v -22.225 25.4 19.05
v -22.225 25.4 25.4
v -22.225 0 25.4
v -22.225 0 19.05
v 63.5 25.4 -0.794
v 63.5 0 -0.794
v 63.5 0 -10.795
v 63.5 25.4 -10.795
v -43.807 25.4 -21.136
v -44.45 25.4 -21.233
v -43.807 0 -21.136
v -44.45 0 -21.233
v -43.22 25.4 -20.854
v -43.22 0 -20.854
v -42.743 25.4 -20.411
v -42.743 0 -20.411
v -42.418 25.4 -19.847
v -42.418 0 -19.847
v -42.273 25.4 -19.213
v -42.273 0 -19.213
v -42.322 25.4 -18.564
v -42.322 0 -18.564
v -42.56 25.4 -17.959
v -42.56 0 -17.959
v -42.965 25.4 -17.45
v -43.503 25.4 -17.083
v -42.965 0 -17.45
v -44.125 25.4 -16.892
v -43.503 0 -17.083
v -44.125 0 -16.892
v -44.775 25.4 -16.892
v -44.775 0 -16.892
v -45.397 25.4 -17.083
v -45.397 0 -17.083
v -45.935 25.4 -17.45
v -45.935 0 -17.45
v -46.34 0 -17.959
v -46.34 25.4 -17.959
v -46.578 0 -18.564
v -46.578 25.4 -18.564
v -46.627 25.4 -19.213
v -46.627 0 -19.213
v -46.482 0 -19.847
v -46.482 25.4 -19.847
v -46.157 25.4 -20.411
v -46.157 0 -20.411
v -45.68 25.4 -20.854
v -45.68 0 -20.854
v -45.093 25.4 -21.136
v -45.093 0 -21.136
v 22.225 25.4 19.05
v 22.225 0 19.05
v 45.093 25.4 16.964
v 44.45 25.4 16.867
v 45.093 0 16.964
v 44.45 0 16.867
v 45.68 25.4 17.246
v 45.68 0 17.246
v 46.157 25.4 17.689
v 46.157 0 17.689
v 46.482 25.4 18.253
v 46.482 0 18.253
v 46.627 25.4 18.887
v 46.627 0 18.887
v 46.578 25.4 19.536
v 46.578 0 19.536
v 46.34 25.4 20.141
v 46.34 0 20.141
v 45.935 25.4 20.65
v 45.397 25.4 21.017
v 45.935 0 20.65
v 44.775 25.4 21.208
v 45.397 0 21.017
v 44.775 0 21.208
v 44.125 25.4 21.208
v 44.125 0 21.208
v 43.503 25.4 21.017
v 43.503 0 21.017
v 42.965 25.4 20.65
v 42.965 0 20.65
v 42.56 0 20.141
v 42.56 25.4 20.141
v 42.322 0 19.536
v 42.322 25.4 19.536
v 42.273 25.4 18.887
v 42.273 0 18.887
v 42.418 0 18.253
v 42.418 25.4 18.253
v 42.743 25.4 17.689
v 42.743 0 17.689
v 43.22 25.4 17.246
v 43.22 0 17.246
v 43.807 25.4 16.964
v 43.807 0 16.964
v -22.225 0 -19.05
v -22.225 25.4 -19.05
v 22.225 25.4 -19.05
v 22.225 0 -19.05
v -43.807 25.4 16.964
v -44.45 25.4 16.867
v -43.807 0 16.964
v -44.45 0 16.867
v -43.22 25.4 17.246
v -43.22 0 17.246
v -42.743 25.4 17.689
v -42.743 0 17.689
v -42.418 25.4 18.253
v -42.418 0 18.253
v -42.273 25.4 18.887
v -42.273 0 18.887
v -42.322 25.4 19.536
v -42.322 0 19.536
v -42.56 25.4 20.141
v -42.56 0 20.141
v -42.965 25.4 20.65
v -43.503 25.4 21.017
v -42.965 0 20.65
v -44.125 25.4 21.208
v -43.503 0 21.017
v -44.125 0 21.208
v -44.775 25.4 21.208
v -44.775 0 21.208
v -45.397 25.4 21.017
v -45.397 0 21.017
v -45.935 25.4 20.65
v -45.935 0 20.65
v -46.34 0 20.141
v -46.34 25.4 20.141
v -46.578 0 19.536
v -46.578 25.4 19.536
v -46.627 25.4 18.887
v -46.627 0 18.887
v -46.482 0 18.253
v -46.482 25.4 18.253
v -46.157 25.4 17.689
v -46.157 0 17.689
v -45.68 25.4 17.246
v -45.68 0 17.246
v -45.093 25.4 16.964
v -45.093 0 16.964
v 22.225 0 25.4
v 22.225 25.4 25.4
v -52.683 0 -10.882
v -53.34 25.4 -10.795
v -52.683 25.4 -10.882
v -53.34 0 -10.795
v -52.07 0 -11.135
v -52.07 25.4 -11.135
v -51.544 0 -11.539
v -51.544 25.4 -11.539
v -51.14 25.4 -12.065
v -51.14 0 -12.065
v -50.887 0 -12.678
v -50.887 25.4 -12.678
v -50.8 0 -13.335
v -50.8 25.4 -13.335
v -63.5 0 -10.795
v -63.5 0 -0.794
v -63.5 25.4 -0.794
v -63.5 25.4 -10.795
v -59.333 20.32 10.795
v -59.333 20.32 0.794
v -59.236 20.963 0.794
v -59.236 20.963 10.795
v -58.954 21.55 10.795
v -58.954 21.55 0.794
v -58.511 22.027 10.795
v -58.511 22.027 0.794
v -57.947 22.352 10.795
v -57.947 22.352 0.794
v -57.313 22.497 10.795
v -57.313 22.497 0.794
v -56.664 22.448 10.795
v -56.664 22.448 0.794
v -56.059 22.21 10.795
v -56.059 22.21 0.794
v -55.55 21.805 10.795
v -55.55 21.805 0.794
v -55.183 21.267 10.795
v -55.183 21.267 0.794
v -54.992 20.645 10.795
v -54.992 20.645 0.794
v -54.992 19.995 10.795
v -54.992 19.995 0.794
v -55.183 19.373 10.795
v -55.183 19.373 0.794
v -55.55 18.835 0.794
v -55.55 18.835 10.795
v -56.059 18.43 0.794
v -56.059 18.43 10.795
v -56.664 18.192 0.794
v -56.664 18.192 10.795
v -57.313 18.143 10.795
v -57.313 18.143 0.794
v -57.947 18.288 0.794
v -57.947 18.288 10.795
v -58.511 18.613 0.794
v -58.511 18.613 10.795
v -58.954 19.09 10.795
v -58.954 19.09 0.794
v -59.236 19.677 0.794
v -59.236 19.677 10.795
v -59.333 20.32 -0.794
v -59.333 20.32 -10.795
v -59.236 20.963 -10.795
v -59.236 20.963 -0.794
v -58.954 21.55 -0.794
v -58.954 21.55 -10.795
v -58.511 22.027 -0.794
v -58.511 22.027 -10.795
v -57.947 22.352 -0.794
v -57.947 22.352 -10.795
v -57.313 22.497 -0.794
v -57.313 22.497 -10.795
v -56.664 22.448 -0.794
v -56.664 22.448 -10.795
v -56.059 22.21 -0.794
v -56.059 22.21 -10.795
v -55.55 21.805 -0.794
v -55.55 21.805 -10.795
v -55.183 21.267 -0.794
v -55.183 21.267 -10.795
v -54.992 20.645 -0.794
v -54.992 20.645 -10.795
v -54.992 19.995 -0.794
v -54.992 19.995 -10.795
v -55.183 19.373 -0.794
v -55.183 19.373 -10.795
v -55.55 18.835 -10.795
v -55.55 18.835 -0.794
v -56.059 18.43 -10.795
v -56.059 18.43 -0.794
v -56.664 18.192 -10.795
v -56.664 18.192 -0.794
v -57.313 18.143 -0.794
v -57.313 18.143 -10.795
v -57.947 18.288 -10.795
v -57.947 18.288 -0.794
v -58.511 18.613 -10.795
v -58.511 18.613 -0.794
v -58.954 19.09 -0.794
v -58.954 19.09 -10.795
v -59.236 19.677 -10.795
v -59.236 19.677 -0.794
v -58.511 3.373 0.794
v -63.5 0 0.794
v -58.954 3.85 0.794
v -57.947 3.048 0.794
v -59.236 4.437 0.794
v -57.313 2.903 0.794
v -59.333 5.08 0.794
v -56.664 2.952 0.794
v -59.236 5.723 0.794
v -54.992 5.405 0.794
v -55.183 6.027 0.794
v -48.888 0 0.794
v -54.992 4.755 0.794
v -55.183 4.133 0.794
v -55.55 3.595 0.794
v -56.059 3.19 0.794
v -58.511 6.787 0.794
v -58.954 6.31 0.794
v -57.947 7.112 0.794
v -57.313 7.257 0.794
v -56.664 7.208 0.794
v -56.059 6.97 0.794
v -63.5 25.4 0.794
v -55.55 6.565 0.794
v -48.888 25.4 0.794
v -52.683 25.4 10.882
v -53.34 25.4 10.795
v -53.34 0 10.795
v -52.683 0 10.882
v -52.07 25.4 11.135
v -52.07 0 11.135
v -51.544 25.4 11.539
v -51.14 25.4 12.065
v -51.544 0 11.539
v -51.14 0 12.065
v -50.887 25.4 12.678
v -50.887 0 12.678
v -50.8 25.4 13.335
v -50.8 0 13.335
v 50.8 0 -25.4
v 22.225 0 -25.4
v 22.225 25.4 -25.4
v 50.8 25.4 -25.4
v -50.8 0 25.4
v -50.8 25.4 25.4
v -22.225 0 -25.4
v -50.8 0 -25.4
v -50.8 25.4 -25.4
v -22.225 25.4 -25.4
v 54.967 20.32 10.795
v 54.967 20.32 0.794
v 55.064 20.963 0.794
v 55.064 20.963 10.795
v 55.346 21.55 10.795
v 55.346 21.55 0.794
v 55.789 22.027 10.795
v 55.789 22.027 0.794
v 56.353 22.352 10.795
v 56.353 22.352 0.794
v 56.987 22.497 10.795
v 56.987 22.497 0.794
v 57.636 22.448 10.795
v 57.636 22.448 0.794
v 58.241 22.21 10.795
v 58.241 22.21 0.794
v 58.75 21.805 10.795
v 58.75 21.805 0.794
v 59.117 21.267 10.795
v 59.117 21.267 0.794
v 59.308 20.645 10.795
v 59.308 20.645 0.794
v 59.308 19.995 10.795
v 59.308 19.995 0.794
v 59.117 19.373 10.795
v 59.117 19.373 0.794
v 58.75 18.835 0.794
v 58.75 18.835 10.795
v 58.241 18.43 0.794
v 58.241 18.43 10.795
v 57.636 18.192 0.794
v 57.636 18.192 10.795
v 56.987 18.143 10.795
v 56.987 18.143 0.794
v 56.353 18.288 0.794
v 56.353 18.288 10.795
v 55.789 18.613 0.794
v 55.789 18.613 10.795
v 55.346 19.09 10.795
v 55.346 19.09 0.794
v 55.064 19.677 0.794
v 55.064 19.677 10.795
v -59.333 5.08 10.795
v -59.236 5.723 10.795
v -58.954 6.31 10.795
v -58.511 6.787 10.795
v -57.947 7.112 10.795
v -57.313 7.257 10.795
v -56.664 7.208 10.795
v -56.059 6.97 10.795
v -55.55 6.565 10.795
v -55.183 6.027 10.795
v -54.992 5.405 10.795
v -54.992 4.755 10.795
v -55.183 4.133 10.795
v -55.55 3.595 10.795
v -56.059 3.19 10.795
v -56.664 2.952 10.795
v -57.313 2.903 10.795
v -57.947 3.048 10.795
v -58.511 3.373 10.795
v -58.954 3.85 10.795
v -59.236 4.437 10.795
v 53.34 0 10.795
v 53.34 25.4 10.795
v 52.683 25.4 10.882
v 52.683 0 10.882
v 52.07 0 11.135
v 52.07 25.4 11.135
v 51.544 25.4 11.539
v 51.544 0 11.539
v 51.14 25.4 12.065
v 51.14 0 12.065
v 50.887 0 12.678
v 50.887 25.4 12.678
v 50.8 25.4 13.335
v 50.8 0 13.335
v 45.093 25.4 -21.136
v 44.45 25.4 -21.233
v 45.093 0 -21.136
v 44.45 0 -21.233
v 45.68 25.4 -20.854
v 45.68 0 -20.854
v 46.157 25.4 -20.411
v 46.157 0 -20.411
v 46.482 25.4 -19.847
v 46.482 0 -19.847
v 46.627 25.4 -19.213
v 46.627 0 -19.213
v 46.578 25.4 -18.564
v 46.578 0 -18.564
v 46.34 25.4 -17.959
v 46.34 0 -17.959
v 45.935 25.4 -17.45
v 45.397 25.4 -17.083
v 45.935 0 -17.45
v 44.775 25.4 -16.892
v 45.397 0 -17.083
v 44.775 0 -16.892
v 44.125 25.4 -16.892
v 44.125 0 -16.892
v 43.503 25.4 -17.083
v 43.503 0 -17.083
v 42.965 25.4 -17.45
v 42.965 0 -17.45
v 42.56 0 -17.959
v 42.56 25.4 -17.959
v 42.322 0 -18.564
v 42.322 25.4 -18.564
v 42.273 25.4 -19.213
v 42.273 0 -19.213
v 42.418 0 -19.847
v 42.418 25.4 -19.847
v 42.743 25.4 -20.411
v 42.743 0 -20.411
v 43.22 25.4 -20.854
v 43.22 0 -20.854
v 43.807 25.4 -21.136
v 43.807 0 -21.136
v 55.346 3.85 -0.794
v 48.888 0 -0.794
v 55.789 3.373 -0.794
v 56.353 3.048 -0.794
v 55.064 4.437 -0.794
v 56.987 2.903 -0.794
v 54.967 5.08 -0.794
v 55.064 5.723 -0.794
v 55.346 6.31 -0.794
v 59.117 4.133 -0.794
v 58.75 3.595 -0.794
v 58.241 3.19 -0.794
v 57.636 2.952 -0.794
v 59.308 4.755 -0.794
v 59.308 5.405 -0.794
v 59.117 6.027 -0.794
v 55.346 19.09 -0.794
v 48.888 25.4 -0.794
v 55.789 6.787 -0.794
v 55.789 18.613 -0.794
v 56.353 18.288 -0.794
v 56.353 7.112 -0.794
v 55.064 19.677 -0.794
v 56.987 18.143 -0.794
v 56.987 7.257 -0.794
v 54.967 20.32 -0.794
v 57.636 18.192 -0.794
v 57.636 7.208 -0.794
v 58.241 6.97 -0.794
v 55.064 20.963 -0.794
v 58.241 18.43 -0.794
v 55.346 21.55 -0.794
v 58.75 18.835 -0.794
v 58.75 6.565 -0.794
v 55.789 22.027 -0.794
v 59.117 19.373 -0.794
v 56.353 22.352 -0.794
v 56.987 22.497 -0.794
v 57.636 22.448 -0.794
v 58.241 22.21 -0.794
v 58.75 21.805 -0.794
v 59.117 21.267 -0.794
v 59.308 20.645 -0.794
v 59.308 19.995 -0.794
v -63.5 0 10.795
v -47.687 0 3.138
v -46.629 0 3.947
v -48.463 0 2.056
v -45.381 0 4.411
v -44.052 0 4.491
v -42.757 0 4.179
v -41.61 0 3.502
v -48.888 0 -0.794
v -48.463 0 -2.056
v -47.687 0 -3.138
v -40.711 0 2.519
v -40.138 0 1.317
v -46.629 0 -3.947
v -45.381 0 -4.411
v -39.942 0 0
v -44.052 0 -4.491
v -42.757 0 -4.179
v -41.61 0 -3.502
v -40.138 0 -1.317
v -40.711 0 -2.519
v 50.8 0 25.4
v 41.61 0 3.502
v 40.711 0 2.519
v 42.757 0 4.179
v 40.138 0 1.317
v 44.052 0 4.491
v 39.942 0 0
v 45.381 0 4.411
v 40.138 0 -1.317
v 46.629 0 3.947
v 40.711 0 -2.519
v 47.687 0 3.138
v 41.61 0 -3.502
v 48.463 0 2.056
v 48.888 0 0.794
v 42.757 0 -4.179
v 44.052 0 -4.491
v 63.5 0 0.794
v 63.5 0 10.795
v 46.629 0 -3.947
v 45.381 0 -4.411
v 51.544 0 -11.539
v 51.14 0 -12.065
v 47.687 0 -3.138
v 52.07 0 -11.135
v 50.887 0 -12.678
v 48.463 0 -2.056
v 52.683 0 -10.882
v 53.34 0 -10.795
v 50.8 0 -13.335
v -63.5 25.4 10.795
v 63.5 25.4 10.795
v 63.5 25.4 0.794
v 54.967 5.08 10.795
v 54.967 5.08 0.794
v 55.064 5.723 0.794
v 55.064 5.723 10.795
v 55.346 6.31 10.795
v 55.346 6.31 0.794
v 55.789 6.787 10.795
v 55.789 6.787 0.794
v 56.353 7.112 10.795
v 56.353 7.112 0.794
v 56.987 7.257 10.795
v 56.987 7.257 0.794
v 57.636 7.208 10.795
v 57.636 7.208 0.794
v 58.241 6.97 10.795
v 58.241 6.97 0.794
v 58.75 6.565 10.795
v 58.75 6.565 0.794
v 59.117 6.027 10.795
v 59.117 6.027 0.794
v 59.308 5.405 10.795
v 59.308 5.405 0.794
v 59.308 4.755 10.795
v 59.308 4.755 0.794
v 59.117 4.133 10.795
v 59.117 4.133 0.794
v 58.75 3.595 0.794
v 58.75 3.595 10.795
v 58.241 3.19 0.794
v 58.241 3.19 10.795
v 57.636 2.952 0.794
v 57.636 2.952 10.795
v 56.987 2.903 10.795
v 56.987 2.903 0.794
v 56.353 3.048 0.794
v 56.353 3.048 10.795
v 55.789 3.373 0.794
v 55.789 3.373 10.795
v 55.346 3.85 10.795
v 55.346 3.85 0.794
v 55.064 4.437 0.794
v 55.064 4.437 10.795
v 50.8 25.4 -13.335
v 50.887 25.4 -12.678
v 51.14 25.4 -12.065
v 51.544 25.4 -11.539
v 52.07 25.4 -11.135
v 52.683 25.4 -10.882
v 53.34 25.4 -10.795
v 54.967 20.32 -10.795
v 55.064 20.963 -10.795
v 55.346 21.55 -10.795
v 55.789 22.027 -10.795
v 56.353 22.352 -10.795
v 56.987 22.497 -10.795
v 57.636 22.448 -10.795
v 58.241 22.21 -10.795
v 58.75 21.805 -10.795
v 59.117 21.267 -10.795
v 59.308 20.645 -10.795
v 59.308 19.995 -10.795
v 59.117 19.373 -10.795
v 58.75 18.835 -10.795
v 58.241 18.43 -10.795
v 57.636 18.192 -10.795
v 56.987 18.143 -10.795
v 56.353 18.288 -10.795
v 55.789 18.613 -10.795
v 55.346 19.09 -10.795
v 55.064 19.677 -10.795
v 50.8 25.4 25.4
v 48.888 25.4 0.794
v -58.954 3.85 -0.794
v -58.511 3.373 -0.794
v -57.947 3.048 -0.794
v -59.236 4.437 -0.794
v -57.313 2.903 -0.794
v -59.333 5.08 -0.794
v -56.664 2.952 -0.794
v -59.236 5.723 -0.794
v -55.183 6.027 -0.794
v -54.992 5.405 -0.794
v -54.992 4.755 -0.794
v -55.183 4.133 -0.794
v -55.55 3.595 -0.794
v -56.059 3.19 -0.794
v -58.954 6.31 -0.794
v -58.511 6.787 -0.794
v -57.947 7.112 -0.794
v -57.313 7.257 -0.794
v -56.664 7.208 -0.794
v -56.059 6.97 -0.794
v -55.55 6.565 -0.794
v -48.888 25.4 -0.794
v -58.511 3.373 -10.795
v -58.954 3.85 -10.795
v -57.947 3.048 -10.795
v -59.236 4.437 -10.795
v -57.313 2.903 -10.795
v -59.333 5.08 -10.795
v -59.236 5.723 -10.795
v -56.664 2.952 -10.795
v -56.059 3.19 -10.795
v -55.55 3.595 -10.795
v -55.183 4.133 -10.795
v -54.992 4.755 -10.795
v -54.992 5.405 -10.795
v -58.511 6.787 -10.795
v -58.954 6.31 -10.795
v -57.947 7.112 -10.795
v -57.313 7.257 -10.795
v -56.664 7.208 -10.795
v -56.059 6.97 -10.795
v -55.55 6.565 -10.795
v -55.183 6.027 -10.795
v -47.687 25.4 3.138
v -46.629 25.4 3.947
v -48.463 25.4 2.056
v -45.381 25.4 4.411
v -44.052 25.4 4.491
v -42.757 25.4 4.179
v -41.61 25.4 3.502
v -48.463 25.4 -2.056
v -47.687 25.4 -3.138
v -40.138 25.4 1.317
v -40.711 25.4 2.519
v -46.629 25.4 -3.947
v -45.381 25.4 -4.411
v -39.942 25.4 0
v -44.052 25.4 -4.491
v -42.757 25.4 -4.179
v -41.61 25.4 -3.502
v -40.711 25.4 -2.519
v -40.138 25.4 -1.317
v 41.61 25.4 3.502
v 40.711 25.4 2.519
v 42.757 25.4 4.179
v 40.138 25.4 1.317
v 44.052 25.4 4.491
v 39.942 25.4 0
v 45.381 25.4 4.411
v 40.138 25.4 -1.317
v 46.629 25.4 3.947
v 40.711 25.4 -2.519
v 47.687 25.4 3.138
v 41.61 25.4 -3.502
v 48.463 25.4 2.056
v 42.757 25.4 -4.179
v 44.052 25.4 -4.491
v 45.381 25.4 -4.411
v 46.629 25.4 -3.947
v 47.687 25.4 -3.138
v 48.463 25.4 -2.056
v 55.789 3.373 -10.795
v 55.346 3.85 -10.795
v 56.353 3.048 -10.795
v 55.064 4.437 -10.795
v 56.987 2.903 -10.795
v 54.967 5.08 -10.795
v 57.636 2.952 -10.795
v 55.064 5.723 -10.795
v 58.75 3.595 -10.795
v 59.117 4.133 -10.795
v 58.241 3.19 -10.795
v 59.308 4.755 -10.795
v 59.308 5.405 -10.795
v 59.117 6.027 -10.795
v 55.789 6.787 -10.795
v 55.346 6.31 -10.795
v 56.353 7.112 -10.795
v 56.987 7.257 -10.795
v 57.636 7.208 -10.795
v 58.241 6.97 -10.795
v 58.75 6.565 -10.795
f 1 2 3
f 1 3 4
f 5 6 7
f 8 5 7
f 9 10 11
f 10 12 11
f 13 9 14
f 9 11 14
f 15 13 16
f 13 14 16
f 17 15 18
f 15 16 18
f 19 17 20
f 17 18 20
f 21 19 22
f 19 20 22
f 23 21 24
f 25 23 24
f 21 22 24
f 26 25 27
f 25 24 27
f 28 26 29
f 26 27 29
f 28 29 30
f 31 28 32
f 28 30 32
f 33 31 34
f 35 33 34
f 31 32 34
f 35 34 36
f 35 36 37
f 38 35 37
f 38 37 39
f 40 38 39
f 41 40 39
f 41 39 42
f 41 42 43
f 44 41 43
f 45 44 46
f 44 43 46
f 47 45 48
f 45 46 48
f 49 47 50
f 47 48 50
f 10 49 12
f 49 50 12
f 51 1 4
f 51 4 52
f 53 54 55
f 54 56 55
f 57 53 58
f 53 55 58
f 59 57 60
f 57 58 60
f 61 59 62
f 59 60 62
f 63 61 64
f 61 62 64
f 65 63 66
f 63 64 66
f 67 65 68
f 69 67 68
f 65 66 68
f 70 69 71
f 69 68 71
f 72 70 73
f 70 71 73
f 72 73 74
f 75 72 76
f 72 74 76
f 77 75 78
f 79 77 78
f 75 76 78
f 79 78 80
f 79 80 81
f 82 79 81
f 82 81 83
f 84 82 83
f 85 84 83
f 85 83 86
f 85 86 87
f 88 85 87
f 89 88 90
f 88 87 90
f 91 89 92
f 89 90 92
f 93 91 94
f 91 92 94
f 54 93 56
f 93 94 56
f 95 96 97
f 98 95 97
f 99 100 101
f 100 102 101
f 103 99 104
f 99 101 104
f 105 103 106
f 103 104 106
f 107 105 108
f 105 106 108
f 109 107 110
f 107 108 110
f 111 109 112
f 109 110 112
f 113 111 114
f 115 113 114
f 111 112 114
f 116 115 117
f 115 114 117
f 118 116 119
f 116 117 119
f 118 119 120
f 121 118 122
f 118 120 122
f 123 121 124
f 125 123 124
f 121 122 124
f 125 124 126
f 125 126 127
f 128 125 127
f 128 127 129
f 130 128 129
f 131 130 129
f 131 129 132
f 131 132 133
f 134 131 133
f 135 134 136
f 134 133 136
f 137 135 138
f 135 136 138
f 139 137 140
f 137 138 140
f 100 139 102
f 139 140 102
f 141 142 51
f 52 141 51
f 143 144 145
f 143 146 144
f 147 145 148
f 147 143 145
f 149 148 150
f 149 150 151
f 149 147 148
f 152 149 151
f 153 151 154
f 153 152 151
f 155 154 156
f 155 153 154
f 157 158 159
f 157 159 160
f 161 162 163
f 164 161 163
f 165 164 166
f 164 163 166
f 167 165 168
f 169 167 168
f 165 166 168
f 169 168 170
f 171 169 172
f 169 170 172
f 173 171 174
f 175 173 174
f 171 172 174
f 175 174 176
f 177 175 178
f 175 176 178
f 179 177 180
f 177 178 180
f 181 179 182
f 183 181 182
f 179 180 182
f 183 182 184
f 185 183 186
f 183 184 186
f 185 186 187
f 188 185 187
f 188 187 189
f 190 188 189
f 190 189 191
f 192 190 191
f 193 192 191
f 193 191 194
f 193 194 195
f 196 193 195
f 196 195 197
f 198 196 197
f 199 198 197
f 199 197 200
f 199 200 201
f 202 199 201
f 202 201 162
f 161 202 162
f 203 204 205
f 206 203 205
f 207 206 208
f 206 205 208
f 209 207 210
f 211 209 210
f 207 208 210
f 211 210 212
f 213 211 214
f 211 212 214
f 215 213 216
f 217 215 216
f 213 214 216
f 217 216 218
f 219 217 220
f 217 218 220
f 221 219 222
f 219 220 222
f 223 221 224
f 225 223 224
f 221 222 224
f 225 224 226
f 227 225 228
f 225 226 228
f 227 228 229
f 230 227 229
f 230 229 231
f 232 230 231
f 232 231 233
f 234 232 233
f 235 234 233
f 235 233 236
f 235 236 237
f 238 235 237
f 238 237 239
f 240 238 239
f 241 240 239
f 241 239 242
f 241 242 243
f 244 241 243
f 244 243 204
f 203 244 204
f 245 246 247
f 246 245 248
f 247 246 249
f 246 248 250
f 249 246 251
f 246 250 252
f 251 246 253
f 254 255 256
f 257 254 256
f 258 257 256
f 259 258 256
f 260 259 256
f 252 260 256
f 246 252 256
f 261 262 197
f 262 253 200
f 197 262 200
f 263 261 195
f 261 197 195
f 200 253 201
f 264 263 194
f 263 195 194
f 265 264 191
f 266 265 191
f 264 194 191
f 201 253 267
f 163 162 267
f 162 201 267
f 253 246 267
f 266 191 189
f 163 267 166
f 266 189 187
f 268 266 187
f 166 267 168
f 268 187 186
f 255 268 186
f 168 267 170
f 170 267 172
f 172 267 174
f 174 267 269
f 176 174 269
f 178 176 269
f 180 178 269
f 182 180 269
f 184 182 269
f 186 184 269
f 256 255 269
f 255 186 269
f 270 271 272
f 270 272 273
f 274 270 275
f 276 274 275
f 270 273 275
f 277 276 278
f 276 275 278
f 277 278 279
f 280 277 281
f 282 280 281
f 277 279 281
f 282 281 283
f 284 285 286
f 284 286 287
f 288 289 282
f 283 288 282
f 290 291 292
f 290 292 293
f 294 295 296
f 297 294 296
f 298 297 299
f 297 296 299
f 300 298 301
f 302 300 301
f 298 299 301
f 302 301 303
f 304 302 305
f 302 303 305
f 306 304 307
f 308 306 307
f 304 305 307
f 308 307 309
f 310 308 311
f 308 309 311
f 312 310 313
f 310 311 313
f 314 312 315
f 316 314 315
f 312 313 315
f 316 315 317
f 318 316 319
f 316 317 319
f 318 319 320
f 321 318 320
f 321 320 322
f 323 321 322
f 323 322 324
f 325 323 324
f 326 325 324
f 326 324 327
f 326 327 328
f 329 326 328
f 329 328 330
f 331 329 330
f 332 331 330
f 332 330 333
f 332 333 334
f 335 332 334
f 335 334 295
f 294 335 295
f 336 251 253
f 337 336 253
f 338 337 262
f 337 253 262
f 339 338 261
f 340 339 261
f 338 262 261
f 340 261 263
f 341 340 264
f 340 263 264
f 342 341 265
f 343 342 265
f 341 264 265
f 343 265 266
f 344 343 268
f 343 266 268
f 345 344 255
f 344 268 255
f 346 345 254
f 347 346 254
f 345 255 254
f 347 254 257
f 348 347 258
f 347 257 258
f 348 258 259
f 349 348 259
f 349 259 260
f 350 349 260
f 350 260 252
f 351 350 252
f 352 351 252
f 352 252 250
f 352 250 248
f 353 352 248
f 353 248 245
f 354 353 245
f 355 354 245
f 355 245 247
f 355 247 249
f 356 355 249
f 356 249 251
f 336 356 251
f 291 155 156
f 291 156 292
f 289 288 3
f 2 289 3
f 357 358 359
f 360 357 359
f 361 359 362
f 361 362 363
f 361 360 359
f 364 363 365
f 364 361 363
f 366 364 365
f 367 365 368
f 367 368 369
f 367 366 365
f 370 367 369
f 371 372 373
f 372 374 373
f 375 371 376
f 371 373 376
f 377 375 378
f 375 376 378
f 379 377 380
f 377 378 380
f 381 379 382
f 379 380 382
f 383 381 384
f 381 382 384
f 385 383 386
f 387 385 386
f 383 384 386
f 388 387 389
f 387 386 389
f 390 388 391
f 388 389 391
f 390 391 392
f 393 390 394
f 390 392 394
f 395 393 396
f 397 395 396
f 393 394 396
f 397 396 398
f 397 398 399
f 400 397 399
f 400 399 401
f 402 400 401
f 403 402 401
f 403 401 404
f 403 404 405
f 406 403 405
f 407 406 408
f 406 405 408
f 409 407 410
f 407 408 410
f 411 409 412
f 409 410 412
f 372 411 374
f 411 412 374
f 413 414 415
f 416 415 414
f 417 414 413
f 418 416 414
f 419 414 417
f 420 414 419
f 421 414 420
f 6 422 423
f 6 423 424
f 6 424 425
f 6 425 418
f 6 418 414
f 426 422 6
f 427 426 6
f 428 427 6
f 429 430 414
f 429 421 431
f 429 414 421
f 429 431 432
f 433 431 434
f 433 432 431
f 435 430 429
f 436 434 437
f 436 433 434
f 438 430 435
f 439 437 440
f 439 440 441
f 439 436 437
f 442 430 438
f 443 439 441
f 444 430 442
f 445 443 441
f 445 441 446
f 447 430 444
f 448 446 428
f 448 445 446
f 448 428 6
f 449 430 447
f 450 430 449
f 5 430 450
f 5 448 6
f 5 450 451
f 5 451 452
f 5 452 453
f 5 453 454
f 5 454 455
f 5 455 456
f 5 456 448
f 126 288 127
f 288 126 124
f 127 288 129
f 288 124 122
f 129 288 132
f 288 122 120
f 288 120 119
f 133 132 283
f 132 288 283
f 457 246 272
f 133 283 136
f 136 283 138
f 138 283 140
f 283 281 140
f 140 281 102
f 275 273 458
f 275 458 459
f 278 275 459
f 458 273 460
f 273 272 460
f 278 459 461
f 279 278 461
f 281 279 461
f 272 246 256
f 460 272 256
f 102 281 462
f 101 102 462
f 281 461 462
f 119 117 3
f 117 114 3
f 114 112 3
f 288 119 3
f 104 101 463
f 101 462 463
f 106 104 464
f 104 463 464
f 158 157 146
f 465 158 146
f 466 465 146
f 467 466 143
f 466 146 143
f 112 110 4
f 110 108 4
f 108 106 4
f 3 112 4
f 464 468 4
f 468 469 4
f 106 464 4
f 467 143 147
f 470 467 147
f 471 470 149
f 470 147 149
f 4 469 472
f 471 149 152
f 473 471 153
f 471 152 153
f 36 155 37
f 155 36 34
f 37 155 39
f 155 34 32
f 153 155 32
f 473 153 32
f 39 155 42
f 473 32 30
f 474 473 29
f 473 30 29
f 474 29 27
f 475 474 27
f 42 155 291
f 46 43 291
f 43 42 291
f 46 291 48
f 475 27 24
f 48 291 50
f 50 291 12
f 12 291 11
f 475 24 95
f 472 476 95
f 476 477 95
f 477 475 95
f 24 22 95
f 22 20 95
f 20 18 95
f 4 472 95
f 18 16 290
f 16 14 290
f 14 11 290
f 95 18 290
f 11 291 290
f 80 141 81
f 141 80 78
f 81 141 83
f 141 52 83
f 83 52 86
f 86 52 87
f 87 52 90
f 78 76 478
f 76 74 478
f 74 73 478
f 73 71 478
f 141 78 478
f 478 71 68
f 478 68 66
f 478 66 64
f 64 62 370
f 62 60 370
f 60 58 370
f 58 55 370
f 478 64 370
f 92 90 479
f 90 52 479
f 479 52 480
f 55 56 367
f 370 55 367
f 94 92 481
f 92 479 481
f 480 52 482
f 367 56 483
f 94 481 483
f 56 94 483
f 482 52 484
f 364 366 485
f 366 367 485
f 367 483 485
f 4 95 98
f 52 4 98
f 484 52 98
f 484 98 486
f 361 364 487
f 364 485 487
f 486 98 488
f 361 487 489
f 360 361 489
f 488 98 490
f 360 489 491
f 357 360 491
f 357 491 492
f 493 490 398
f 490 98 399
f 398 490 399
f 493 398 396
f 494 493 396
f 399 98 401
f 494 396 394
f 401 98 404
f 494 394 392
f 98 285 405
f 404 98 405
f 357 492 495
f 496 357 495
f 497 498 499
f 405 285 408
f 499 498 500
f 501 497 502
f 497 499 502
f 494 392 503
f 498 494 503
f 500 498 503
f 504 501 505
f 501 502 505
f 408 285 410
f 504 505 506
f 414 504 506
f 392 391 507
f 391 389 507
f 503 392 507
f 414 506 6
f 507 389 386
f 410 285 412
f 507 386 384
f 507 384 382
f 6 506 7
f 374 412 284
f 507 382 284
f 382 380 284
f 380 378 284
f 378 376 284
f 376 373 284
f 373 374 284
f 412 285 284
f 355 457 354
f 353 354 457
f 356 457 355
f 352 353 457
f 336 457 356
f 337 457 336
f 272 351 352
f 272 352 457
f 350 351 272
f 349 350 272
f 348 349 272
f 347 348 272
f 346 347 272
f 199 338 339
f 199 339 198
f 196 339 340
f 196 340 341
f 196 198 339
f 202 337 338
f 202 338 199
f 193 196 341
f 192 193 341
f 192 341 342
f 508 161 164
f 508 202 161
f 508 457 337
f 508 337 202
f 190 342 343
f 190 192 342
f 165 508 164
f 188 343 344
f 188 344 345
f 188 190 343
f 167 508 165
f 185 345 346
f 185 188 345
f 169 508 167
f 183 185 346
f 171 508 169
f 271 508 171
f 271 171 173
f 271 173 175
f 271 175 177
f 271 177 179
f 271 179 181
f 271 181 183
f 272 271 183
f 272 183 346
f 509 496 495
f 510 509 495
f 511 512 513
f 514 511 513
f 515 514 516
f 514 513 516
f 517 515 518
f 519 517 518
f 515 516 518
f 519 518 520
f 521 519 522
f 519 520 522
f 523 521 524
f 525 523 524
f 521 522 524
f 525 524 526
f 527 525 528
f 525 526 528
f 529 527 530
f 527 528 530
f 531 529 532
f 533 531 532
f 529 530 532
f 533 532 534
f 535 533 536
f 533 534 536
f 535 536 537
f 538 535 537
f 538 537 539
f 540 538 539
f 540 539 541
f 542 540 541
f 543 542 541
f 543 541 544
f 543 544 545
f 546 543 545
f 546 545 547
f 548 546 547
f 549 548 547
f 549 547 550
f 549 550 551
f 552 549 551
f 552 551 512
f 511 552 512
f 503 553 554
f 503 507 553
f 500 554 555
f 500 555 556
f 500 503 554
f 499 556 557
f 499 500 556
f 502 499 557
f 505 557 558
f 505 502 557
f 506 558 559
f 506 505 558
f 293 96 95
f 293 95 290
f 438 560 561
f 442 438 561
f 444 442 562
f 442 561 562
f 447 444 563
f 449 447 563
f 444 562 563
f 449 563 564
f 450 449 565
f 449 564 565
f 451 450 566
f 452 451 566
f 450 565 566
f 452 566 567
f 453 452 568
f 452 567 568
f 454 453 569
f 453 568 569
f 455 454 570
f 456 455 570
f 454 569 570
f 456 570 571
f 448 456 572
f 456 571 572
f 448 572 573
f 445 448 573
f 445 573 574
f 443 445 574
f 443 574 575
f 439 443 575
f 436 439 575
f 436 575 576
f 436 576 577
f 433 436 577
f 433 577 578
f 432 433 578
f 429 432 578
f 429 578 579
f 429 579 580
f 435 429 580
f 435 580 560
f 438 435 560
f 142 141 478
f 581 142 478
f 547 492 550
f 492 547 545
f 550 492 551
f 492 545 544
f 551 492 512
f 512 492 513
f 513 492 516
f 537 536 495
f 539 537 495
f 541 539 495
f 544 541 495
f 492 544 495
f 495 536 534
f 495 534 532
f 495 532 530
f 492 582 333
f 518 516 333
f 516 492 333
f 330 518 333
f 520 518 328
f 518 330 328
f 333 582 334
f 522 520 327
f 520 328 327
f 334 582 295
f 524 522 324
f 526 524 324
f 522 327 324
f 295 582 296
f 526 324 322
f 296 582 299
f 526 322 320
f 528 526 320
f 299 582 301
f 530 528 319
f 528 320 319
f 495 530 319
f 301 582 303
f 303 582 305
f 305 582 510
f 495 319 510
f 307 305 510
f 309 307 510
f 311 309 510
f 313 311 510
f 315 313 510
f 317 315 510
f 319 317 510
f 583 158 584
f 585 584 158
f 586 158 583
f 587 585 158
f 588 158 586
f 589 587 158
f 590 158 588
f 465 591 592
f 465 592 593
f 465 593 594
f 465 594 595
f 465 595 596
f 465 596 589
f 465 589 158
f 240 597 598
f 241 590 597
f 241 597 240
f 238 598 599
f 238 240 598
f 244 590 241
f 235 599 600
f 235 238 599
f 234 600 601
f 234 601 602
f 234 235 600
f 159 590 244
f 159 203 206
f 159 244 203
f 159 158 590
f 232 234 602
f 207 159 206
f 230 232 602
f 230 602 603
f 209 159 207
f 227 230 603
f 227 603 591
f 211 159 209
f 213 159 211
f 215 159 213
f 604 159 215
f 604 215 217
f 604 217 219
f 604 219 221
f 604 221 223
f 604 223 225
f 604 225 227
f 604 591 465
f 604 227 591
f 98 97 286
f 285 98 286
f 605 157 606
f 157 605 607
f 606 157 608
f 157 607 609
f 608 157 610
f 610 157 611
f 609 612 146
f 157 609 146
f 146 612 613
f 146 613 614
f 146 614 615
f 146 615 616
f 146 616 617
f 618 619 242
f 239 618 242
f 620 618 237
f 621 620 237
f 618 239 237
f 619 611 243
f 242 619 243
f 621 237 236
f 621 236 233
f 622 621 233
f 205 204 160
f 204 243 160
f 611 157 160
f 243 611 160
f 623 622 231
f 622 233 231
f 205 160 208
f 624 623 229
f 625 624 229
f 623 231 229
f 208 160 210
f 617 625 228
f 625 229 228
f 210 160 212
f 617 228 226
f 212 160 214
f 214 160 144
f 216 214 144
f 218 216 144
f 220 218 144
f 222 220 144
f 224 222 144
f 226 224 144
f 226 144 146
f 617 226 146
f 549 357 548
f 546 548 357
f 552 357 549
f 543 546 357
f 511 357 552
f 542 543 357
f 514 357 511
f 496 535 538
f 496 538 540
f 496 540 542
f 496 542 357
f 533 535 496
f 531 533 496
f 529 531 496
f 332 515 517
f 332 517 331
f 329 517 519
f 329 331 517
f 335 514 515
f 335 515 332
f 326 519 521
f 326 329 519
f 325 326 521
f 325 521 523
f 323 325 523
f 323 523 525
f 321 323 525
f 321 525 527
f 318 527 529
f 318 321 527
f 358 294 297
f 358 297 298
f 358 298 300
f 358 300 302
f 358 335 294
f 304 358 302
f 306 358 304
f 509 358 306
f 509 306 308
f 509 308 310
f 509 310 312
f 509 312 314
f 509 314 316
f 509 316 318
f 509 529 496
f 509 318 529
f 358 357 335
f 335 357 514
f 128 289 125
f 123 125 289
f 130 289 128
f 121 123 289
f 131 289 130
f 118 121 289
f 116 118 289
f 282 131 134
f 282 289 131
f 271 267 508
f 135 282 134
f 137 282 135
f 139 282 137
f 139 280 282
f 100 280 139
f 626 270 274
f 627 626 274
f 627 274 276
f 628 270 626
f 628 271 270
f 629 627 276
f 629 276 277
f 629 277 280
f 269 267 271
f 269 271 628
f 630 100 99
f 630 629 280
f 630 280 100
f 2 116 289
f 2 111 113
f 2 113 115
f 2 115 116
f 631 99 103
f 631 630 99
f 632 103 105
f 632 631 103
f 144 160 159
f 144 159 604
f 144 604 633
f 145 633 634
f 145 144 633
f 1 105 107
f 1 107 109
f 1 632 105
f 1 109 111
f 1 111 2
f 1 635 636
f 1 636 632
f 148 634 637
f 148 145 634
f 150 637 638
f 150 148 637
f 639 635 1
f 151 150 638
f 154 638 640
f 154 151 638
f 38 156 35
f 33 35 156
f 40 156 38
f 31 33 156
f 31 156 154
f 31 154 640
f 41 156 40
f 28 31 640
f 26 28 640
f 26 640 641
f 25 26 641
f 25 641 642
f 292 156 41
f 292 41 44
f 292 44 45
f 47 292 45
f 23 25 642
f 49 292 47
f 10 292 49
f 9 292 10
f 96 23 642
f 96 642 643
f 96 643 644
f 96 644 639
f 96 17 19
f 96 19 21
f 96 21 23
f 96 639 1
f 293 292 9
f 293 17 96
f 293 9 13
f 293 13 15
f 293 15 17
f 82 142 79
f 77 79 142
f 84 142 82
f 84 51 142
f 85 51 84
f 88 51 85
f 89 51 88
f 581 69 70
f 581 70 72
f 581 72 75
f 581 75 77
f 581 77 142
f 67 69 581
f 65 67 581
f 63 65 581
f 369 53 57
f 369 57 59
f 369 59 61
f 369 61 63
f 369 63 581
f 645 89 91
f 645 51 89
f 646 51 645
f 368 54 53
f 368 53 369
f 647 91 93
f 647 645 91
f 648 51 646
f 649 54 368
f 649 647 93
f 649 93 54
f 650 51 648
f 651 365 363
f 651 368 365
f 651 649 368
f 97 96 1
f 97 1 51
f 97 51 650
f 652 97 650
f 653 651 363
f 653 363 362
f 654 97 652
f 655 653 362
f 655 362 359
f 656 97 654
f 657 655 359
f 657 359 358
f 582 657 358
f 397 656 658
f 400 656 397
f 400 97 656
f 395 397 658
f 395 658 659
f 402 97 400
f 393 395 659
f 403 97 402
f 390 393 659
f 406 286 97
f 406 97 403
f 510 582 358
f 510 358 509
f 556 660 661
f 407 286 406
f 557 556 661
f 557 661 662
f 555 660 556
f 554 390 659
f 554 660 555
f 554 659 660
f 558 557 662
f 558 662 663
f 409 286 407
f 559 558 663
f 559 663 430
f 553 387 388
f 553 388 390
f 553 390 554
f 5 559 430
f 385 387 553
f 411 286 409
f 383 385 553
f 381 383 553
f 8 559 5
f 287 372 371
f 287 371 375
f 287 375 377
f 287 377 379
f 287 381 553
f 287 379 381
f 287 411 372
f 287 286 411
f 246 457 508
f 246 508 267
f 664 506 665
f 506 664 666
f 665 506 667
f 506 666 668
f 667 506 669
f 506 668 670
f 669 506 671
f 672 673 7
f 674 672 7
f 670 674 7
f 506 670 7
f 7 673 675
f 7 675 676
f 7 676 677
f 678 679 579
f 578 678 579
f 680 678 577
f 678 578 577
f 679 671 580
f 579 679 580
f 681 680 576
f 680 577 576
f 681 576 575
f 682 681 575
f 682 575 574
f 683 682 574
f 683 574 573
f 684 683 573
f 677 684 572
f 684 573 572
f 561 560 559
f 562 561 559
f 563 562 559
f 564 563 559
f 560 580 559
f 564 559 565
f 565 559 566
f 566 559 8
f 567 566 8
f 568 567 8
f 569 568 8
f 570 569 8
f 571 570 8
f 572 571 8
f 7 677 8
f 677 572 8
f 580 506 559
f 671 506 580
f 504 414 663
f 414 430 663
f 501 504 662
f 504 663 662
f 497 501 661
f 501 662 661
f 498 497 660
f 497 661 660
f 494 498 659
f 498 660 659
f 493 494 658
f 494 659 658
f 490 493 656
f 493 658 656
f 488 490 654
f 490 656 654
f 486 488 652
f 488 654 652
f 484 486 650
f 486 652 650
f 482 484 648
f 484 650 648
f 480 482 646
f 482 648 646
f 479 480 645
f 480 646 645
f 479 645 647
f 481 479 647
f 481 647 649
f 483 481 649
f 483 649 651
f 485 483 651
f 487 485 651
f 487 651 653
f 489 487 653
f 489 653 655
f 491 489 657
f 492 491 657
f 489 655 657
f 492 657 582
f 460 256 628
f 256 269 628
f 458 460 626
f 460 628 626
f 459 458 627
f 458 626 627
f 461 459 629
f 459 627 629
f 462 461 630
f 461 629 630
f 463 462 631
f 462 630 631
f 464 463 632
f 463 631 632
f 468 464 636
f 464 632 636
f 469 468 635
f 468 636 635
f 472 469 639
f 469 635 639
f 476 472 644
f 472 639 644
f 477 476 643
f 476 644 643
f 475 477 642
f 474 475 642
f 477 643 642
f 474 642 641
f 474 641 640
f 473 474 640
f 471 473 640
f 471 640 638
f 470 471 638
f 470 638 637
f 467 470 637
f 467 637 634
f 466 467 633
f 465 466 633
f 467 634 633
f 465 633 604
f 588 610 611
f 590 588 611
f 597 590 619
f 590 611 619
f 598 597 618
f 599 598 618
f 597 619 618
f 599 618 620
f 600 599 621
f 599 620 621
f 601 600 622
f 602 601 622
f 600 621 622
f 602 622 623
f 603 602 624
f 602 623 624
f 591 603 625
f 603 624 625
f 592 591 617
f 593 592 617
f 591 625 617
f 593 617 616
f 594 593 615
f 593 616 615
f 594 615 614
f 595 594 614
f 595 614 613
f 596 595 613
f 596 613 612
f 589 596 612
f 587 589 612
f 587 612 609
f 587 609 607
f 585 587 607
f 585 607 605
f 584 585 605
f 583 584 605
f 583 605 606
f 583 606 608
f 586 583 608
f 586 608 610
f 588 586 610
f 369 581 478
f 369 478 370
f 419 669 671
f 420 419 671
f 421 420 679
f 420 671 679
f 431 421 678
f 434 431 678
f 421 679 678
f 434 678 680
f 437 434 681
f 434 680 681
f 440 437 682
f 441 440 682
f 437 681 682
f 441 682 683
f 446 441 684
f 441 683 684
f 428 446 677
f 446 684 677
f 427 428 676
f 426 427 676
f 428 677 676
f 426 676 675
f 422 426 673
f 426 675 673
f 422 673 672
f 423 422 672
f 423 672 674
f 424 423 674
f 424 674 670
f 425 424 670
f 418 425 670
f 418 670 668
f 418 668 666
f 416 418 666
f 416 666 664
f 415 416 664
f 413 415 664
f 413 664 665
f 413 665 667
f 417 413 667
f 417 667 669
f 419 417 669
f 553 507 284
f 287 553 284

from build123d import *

# Parameters (mm, degrees)
SKETCH1_W                            = 127
SKETCH1_H                            = 50.8
BOSS_EXTRUDE1_DEPTH                  = 25.4
SKETCH2_R                            = 4.5085
CUT_EXTRUDE1_DEPTH                   = 73.955945611
SKETCH3_W                            = 19.05
SKETCH3_H                            = 1.5875
CUT_EXTRUDE2_DEPTH                   = 73.955945611
SKETCH4_W                            = 12.7
SKETCH4_H                            = 14.605
CUT_EXTRUDE3_DEPTH                   = 73.955945611
F_11_64_0_17188_DIAMETER_HOLE1_D     = 4.365752
F_11_64_0_17188_DIAMETER_HOLE1_DEPTH = 25.4
F_11_64_0_17188_DIAMETER_HOLE1_TIP   = 1.311604225
FILLET3_R                            = 2.54
F_11_64_0_17188_DIAMETER_HOLE2_D     = 4.365752
F_11_64_0_17188_DIAMETER_HOLE2_DEPTH = 25.4
F_11_64_0_17188_DIAMETER_HOLE2_TIP   = 1.311604225
SKETCH9_W                            = 44.45
SKETCH9_H                            = 6.35
CUT_EXTRUDE4_DEPTH                   = 73.955945611


with BuildPart() as part:
    # Sketch1 → Boss-Extrude1 (new body)
    with BuildSketch(Plane(origin=(0, 0, 0), x_dir=(1, 0, 0), z_dir=(0, 1, 0))):
        Rectangle(SKETCH1_W, SKETCH1_H)
    extrude(amount=BOSS_EXTRUDE1_DEPTH)

    # Sketch2 → Cut-Extrude1 (cut, through all)
    with BuildSketch(Plane(origin=(0, 25.4, 0), x_dir=(1, 0, 0), z_dir=(0, 1, 0))):
        with Locations(Location((-44.45, 0, 0), (0, 0, 270))):
            Circle(SKETCH2_R)
        with Locations(Location((44.45, 0, 0), (0, 0, 270))):
            Circle(SKETCH2_R)
    extrude(amount=-CUT_EXTRUDE1_DEPTH, mode=Mode.SUBTRACT)

    # Sketch3 → Cut-Extrude2 (cut, through all)
    with BuildSketch(Plane(origin=(0, 25.4, 0), x_dir=(1, 0, 0), z_dir=(0, 1, 0))):
        with Locations((-53.975, 0)):
            Rectangle(SKETCH3_W, SKETCH3_H)
        with Locations((53.975, 0)):
            Rectangle(SKETCH3_W, SKETCH3_H)
    extrude(amount=-CUT_EXTRUDE2_DEPTH, mode=Mode.SUBTRACT)

    # Sketch4 → Cut-Extrude3 (cut, through all)
    with BuildSketch(Plane(origin=(0, 25.4, 0), x_dir=(1, 0, 0), z_dir=(0, 1, 0))):
        with Locations((-57.15, -18.0975)):
            Rectangle(SKETCH4_W, SKETCH4_H)
        with Locations((-57.15, 18.0975)):
            Rectangle(SKETCH4_W, SKETCH4_H)
        with Locations((57.15, 18.0975)):
            Rectangle(SKETCH4_W, SKETCH4_H)
        with Locations((57.15, -18.0975)):
            Rectangle(SKETCH4_W, SKETCH4_H)
    extrude(amount=-CUT_EXTRUDE3_DEPTH, mode=Mode.SUBTRACT)

    # 11/64 (0.17188) Diameter Hole1
    with Locations(Plane(origin=(-57.15, 20.32, 10.795), x_dir=(1, 0, 0), z_dir=(0, 0, 1))):
        with Locations((0, 0), (0, -15.24), (114.3, 0), (114.3, -15.24)):
            Hole(F_11_64_0_17188_DIAMETER_HOLE1_D / 2, depth=F_11_64_0_17188_DIAMETER_HOLE1_DEPTH)
            with Locations((0, 0, -(F_11_64_0_17188_DIAMETER_HOLE1_DEPTH + F_11_64_0_17188_DIAMETER_HOLE1_TIP / 2))):  # 118° drill point
                Cone(0, F_11_64_0_17188_DIAMETER_HOLE1_D / 2, F_11_64_0_17188_DIAMETER_HOLE1_TIP, mode=Mode.SUBTRACT)

    # Fillet3
    fillet3_edges = [part.edges().sort_by_distance(p)[0] for p in [
        (50.8, 12.7, 10.795),
        (-50.8, 12.7, 10.795),
        (-50.8, 12.7, -10.795),
        (50.8, 12.7, -10.795),
    ]]
    fillet(fillet3_edges, radius=FILLET3_R)

    # 11/64 (0.17188) Diameter Hole2
    with Locations(Plane(origin=(-44.45, 25.4, -19.05), x_dir=(0, 0, 1), z_dir=(0, 1, 0))):
        with Locations((0, 0), (38.1, 0), (38.1, 88.9), (0, 88.9)):
            Hole(F_11_64_0_17188_DIAMETER_HOLE2_D / 2, depth=F_11_64_0_17188_DIAMETER_HOLE2_DEPTH)
            with Locations((0, 0, -(F_11_64_0_17188_DIAMETER_HOLE2_DEPTH + F_11_64_0_17188_DIAMETER_HOLE2_TIP / 2))):  # 118° drill point
                Cone(0, F_11_64_0_17188_DIAMETER_HOLE2_D / 2, F_11_64_0_17188_DIAMETER_HOLE2_TIP, mode=Mode.SUBTRACT)

    # Sketch9 → Cut-Extrude4 (cut, through all)
    with BuildSketch(Plane(origin=(0, 25.4, 0), x_dir=(1, 0, 0), z_dir=(0, 1, 0))):
        with Locations((0, -22.225)):
            Rectangle(SKETCH9_W, SKETCH9_H)
        with Locations((0, 22.225)):
            Rectangle(SKETCH9_W, SKETCH9_H)
    extrude(amount=-CUT_EXTRUDE4_DEPTH, mode=Mode.SUBTRACT)


solid = part.part
